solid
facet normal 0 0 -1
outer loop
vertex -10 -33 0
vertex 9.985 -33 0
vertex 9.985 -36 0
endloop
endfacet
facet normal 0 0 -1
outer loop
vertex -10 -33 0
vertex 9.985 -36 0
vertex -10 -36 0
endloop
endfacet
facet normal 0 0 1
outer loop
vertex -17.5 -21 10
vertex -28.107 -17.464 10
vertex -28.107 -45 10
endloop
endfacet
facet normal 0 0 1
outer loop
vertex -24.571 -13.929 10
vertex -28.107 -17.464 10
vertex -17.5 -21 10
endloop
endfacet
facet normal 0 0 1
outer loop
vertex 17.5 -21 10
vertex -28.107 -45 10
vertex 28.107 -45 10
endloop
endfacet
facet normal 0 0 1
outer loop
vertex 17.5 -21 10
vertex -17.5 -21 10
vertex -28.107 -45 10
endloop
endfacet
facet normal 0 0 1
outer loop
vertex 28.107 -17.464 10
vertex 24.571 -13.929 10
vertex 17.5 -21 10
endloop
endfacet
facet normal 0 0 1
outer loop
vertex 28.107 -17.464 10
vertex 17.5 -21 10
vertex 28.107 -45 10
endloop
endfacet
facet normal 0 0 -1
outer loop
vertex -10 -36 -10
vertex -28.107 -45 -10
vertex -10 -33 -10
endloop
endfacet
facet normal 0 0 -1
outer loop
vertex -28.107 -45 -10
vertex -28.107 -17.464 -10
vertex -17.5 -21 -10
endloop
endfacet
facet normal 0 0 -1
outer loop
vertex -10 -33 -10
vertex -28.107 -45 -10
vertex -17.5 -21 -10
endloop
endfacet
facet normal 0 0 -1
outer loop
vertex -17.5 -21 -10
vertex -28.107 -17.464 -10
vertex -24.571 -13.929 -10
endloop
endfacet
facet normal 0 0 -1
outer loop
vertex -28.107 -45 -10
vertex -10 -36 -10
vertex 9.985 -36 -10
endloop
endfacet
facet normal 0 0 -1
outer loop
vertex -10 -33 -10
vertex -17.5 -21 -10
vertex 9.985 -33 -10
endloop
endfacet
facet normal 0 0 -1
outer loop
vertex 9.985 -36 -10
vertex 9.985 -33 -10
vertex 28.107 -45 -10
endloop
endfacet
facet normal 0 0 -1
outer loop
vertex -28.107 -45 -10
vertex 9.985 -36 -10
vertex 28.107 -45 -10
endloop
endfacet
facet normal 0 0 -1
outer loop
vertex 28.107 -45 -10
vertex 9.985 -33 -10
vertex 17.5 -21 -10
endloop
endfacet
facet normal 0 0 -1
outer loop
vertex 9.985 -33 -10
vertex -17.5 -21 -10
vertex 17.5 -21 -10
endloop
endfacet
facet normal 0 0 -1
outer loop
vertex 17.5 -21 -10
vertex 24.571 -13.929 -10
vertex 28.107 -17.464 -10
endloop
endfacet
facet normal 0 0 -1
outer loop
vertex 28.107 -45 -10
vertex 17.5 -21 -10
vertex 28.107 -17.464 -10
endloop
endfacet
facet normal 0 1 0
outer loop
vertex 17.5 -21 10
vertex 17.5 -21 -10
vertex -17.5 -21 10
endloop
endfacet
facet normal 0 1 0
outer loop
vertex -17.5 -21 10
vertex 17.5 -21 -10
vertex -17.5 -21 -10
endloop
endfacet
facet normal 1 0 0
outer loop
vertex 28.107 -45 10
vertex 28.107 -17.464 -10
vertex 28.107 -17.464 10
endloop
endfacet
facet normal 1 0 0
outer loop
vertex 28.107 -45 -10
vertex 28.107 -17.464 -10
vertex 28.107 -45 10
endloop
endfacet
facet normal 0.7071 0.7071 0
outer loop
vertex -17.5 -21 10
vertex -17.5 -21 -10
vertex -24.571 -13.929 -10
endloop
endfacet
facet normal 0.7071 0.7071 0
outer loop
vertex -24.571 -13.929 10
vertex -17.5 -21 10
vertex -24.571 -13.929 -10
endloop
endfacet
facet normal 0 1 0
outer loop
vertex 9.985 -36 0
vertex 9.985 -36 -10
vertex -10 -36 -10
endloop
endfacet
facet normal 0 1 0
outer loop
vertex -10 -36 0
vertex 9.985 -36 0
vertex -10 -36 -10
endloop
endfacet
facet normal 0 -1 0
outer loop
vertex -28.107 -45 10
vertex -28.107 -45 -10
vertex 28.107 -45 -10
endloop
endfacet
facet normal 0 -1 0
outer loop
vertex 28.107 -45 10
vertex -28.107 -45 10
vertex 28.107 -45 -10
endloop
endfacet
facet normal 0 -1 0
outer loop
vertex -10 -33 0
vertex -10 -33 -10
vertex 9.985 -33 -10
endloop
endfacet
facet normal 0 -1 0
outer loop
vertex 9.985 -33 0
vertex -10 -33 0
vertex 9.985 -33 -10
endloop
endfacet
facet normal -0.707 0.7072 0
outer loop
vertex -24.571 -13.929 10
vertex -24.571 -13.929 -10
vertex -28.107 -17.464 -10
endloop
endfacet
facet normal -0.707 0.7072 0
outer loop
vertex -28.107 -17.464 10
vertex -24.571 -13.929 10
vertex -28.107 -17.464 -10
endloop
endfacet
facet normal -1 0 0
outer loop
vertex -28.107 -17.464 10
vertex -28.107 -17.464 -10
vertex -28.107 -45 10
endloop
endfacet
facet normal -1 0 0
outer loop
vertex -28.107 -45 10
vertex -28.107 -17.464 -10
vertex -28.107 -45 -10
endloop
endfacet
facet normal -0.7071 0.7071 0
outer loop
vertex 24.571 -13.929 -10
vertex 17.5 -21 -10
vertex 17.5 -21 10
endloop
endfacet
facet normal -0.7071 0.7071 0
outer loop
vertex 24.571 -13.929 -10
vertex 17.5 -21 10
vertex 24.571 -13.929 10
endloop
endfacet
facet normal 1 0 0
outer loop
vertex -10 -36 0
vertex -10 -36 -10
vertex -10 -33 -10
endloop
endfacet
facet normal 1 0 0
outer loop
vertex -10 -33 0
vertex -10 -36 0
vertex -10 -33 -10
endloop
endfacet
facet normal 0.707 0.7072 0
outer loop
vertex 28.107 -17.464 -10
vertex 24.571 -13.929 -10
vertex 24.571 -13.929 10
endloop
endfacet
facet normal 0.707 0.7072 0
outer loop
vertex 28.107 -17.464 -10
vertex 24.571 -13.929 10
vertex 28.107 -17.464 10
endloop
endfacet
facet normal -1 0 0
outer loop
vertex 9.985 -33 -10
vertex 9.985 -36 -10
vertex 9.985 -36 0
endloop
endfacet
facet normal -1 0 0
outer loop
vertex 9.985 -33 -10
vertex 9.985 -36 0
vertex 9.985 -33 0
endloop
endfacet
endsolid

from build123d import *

# Parameters (mm, degrees)
BOSS_EXTRUDE1_DEPTH      = 10
BOSS_EXTRUDE1_DEPTH_BACK = 10
SKETCH3_W                = 19.984775587
SKETCH3_H                = 3
CUT_EXTRUDE1_DEPTH       = 10


with BuildPart() as part:
    # Sketch2 → Boss-Extrude1 (new, two sides: drawn at the far end of the back side and taken through both)
    with BuildSketch(Plane.XY.offset(-BOSS_EXTRUDE1_DEPTH_BACK)):
        Polygon((28.106601718, -45), (28.106601718, -17.464466094), (24.571067812, -13.928932188), (17.5, -21), (-17.5, -21), (-24.571067812, -13.928932188), (-28.106601718, -17.464466094), (-28.106601718, -45), align=None)
    extrude(amount=BOSS_EXTRUDE1_DEPTH + BOSS_EXTRUDE1_DEPTH_BACK)

    # Sketch3 → Cut-Extrude1 (cut)
    with BuildSketch(Plane(origin=(0, 0, -10), x_dir=(-1, 0, 0), z_dir=(0, 0, -1))):
        with Locations((0.007612206, -34.5)):
            Rectangle(SKETCH3_W, SKETCH3_H)
    extrude(amount=-CUT_EXTRUDE1_DEPTH, mode=Mode.SUBTRACT)


solid = part.part
